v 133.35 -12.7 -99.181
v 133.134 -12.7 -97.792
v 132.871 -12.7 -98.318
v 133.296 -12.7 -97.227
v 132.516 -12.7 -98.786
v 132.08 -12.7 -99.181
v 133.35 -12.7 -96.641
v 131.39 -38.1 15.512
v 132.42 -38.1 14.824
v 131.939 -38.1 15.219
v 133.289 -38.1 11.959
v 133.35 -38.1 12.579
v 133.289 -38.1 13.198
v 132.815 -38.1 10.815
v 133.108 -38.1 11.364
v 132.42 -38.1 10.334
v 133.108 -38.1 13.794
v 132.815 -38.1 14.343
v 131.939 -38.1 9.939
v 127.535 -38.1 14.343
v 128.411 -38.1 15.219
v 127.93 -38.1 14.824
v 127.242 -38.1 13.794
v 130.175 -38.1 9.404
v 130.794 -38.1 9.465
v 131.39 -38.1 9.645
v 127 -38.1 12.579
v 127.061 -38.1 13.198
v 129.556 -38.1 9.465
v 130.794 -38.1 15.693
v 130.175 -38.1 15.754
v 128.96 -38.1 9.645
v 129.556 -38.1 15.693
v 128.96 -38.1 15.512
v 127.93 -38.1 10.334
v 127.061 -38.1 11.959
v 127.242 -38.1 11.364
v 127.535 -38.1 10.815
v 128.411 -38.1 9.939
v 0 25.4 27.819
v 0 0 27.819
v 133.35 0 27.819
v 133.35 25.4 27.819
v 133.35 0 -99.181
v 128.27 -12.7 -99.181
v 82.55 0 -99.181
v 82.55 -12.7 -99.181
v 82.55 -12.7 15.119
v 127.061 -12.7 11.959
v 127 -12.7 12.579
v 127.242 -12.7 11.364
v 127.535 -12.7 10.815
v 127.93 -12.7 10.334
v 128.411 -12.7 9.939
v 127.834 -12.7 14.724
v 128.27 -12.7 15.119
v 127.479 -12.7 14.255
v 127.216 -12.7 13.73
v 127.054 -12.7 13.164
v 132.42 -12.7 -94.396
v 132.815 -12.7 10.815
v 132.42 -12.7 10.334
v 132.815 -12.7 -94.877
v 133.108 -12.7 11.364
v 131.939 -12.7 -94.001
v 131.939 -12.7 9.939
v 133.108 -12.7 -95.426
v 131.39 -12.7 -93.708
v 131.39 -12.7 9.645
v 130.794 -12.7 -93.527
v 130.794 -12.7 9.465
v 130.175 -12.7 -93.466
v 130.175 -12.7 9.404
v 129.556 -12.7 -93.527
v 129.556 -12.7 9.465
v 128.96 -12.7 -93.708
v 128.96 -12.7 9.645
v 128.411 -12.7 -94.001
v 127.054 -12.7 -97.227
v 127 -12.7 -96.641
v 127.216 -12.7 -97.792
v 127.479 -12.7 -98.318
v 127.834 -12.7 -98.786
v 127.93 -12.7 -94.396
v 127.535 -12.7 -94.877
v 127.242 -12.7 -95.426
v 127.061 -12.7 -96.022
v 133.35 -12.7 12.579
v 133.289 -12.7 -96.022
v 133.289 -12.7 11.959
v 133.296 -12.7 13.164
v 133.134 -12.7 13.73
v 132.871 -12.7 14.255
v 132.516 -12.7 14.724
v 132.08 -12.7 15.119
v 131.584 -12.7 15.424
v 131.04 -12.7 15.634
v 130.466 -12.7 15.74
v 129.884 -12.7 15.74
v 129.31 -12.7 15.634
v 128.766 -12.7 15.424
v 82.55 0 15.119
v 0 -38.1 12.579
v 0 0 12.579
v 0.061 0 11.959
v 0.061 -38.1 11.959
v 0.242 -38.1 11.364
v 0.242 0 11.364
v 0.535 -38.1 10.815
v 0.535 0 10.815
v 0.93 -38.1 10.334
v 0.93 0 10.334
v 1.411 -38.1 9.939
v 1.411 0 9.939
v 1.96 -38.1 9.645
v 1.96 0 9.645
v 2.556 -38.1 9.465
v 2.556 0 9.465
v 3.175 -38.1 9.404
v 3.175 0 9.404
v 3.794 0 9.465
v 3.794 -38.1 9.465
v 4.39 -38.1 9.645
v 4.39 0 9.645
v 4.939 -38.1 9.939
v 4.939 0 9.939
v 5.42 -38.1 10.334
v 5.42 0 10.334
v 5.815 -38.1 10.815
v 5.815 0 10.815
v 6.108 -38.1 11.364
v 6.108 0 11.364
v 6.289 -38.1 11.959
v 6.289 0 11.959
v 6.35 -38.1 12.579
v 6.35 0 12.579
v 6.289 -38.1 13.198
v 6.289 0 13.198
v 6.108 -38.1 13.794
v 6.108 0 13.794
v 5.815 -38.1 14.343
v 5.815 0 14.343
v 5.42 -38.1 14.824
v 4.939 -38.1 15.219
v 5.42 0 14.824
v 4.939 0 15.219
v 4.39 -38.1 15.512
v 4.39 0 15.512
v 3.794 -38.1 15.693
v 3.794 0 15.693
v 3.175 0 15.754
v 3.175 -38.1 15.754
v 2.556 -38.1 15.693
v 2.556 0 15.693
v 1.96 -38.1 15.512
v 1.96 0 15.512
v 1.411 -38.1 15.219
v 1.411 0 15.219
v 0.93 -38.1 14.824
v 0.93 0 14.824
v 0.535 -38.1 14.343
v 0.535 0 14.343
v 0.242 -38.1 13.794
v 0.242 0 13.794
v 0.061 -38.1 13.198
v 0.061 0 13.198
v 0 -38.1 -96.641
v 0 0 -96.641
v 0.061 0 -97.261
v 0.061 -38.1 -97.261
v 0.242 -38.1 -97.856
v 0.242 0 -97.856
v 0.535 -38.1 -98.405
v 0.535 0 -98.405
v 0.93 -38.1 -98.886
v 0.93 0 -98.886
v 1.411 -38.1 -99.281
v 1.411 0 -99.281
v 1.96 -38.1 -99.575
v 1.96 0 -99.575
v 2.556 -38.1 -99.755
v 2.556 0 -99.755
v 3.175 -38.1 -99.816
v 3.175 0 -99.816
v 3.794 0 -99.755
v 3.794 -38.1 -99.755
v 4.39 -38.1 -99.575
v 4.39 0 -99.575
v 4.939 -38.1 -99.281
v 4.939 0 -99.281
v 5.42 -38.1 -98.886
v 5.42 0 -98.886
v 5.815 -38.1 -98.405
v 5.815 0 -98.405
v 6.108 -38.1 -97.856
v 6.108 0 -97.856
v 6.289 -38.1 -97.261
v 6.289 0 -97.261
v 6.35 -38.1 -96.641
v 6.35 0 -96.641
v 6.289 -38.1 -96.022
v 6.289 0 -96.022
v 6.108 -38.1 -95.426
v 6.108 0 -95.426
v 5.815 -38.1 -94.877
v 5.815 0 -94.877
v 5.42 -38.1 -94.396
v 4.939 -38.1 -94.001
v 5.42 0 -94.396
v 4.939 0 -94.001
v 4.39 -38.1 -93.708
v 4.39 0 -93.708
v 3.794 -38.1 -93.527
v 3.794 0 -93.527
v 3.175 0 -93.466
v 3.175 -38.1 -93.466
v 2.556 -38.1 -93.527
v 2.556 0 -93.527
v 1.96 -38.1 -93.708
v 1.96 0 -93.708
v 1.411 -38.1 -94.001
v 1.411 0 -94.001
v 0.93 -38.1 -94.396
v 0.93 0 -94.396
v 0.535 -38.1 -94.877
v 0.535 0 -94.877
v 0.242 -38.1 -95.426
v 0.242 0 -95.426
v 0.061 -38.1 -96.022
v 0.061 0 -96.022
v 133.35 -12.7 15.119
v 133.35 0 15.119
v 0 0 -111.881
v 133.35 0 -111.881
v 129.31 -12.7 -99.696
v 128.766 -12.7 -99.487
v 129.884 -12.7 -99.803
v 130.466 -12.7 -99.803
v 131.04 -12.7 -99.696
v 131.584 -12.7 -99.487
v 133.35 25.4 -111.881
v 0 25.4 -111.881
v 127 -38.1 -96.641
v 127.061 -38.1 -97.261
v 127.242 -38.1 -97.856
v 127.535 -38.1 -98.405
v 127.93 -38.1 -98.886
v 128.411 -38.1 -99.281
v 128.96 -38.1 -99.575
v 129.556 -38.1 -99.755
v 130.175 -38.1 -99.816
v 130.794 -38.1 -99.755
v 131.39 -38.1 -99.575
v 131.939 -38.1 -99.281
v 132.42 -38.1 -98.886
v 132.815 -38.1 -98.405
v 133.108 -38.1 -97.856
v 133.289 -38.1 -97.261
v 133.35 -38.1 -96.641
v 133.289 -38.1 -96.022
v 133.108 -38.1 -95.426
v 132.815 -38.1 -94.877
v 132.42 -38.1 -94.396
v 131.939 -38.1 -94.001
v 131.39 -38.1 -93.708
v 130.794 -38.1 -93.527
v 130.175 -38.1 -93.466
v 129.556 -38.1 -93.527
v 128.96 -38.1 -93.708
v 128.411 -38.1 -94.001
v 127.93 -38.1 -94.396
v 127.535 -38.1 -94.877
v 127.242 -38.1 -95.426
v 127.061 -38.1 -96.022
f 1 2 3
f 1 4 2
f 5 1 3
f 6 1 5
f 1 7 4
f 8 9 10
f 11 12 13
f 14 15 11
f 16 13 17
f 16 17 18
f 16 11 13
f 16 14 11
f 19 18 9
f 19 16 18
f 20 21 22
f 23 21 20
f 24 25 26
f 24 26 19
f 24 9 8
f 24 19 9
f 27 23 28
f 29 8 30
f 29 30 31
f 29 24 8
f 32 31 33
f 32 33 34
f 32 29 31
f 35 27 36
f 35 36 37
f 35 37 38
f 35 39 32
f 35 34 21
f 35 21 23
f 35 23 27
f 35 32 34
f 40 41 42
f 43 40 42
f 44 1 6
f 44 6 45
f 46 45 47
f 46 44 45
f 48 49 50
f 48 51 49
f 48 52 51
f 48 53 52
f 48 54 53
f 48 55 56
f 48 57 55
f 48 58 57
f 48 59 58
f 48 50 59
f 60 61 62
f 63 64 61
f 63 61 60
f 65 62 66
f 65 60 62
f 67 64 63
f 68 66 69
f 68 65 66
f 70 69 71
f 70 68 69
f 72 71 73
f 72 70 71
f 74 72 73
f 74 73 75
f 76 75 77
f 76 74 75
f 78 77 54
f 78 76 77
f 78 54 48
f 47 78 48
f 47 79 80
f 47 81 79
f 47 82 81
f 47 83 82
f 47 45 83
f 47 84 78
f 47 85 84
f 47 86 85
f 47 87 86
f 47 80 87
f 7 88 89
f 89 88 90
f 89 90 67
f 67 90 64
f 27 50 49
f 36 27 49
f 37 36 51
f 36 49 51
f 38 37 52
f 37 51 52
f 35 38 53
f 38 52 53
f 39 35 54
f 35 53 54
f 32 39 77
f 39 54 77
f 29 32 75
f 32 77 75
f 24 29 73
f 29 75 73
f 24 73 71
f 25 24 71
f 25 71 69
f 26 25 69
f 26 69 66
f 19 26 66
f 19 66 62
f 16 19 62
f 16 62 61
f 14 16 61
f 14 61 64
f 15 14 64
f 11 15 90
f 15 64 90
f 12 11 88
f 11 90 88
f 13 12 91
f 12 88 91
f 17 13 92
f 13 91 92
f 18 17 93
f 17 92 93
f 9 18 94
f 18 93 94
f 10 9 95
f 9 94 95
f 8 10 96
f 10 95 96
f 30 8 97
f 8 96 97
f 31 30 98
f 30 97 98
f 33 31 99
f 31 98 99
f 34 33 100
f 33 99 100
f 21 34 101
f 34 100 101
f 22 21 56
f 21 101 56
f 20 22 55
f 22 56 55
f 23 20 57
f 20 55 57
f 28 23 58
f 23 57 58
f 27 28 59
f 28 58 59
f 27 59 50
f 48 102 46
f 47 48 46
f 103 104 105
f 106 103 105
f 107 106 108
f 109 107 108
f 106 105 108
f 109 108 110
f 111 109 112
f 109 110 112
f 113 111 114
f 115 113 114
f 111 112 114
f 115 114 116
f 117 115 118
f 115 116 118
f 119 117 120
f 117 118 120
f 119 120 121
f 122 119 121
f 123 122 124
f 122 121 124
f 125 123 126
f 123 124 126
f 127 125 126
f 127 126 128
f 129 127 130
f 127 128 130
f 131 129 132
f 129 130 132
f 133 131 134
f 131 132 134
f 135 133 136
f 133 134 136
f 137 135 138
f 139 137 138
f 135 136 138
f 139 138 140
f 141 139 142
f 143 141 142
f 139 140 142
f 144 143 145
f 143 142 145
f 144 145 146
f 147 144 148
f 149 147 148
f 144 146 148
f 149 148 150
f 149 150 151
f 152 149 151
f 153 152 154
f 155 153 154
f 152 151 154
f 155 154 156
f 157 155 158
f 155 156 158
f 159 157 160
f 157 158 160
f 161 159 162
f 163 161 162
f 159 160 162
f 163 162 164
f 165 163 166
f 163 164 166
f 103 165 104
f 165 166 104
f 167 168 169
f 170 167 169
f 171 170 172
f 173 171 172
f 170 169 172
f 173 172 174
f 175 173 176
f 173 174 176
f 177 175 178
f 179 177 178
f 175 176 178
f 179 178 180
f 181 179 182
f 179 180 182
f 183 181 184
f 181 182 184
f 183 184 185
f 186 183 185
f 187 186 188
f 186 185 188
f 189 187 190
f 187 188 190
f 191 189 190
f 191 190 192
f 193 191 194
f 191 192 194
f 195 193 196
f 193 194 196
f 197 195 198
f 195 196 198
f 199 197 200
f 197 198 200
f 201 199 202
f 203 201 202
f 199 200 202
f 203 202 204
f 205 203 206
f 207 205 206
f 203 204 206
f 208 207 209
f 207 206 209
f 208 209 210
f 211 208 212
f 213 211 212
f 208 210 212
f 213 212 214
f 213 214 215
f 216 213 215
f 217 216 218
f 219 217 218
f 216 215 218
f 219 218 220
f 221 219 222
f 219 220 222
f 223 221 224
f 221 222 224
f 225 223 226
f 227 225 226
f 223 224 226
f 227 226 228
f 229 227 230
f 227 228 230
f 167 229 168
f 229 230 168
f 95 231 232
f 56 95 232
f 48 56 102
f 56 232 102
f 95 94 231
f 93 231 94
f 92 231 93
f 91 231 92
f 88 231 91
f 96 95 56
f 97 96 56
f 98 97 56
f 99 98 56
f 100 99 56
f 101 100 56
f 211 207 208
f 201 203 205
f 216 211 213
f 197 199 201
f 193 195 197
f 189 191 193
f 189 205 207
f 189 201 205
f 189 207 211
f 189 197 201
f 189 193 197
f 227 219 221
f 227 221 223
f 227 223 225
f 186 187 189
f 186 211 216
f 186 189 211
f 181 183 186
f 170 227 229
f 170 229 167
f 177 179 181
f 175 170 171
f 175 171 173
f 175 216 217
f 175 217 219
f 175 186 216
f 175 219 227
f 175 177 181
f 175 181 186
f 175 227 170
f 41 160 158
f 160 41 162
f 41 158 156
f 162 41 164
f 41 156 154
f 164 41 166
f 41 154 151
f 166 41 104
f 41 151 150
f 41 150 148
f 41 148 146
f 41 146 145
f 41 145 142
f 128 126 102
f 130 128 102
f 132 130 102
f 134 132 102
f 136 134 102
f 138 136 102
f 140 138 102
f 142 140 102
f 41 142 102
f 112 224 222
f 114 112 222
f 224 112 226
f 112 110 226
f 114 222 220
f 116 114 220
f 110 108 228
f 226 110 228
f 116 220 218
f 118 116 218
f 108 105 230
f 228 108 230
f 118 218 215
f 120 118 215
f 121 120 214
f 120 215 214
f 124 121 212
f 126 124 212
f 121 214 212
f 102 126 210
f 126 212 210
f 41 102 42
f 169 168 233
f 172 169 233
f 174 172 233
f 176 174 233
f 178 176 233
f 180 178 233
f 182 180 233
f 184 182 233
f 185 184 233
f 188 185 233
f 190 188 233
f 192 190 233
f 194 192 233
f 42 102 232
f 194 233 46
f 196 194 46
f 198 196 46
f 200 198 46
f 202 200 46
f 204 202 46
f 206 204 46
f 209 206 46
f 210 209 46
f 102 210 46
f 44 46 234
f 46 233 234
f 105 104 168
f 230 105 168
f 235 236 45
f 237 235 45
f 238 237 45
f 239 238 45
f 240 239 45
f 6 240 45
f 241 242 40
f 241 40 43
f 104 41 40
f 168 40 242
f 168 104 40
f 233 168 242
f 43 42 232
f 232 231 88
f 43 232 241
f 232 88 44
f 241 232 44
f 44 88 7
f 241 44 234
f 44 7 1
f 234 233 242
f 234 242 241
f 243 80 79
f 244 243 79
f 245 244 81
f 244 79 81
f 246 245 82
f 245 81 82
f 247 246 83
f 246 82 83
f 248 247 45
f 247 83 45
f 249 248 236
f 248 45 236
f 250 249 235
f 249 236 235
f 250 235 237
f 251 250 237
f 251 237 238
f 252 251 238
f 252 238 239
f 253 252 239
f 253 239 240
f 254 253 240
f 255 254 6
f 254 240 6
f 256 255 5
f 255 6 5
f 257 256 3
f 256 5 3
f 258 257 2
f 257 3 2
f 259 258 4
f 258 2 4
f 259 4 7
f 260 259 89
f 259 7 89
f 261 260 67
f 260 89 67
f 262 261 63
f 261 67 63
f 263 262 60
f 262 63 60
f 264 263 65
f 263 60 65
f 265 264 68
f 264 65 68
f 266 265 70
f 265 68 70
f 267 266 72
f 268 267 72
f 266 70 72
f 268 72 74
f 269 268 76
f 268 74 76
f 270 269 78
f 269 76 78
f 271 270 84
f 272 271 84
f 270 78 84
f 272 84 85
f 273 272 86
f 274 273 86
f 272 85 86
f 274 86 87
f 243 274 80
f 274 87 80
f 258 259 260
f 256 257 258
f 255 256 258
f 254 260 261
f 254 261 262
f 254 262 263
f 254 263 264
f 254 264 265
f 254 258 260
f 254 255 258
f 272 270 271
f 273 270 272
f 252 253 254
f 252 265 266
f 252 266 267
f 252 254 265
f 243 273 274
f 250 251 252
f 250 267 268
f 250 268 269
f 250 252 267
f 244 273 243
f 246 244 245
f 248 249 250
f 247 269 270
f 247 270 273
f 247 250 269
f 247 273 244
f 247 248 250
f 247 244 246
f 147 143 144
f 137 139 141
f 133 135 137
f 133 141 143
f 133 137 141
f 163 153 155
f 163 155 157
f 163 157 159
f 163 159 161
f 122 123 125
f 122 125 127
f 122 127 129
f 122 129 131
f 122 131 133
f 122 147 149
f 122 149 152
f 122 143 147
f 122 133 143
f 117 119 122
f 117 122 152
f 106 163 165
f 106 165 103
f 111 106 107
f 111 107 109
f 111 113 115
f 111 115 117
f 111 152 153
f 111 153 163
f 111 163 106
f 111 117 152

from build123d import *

# Parameters (mm, degrees)
SKETCH1_W           = 133.35
SKETCH1_H           = 139.7
BOSS_EXTRUDE1_DEPTH = 25.4
SKETCH2_W           = 50.8
SKETCH2_H           = 114.3
BOSS_EXTRUDE2_DEPTH = 12.7
SKETCH3_R           = 3.175
BOSS_EXTRUDE3_DEPTH = 38.1
SKETCH4_R           = 3.175
BOSS_EXTRUDE4_DEPTH = 38.1
SKETCH5_R           = 3.175
BOSS_EXTRUDE5_DEPTH = 25.4
SKETCH6_R           = 3.175
BOSS_EXTRUDE6_DEPTH = 25.4


with BuildPart() as part:
    # Sketch1 → Boss-Extrude1 (new body)
    with BuildSketch(Plane(origin=(0, 0, 0), x_dir=(1, 0, 0), z_dir=(0, 1, 0))):
        with Locations((66.675, 42.031328285)):
            Rectangle(SKETCH1_W, SKETCH1_H)
    extrude(amount=BOSS_EXTRUDE1_DEPTH)

    # Sketch2 → Boss-Extrude2 (add)
    with BuildSketch(Plane(origin=(0, 0, 0), x_dir=(-1, 0, 0), z_dir=(0, -1, 0))):
        with Locations((-107.95, 42.031328285)):
            Rectangle(SKETCH2_W, SKETCH2_H)
    extrude(amount=BOSS_EXTRUDE2_DEPTH)

    # Sketch3 → Boss-Extrude3 (add)
    with BuildSketch(Plane(origin=(0, 0, 0), x_dir=(-1, 0, 0), z_dir=(0, -1, 0))):
        with Locations((-3.175, 96.641328285)):
            Circle(SKETCH3_R)
    extrude(amount=BOSS_EXTRUDE3_DEPTH)

    # Sketch4 → Boss-Extrude4 (add)
    with BuildSketch(Plane(origin=(0, 0, 0), x_dir=(-1, 0, 0), z_dir=(0, -1, 0))):
        with Locations((-3.175, -12.578671715)):
            Circle(SKETCH4_R)
    extrude(amount=BOSS_EXTRUDE4_DEPTH)

    # Sketch5 → Boss-Extrude5 (add)
    with BuildSketch(Plane(origin=(0, -12.7, 0), x_dir=(-1, 0, 0), z_dir=(0, -1, 0))):
        with Locations((-130.175, 96.641328285)):
            Circle(SKETCH5_R)
    extrude(amount=BOSS_EXTRUDE5_DEPTH)

    # Sketch6 → Boss-Extrude6 (add)
    with BuildSketch(Plane(origin=(0, -12.7, 0), x_dir=(-1, 0, 0), z_dir=(0, -1, 0))):
        with Locations((-130.175, -12.578671715)):
            Circle(SKETCH6_R)
    extrude(amount=BOSS_EXTRUDE6_DEPTH)


solid = part.part
